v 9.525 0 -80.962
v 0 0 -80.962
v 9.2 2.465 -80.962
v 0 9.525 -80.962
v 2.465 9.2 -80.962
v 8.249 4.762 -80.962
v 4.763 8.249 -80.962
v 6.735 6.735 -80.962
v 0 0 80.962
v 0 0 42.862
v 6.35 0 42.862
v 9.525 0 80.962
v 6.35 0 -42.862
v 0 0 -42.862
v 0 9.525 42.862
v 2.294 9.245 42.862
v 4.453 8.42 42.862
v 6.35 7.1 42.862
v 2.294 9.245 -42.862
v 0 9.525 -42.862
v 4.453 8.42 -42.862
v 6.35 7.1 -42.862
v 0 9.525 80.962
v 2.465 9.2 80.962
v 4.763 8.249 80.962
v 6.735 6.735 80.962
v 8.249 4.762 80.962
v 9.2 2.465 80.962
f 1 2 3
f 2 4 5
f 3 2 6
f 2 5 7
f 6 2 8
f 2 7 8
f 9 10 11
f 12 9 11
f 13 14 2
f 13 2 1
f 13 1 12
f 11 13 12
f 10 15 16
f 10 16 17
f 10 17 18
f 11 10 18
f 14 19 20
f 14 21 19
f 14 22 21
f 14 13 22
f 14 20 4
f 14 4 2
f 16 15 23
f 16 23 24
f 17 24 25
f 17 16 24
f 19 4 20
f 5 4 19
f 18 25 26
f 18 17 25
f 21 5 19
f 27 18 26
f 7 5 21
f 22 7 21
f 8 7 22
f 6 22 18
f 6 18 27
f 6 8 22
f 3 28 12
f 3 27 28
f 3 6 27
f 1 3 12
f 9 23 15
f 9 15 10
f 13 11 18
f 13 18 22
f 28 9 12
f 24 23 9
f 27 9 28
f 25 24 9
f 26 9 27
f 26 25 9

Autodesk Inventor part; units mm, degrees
ref_plane "YZ Plane" through (0, 0, 0) normal (1, 0, 0) x (0, 1, 0)
ref_plane "XZ Plane" through (0, 0, 0) normal (0, 1, 0) x (-1, 0, 0)
ref_plane "XY Plane" through (0, 0, 0) normal (0, 0, 1) x (1, 0, 0)
sketch "Sketch1" plane through (0, 0, 0) normal (0, 0, 1) x (1, 0, 0)
  arc A0 (9.525, 0) -> (0, 9.525) centre (0, 0) ccw
  line L0 (0, 9.525) -> (0, 0)
  line L1 (0, 0) -> (9.525, 0)
  dimension "d0" = 19.05
extrude "Extrusion1" add sketch "Sketch1" along normal mid plane 161.925
sketch "Sketch2" plane through (0, 0, 80.9625) normal (0, -1, 0) x (1, 0, 0)
  line L0 (0, -38.1) -> (6.35, -38.1)
  line L1 (6.35, -38.1) -> (6.35, -123.825)
  line L2 (6.35, -123.825) -> (0, -123.825)
  line L3 (0, -123.825) -> (0, -38.1)
  line L4 (9.525, -161.925) -> (0, -161.925) projected
  line L5 (0, -161.925) -> (0, 0) projected
  point P0 (0, -80.9625)
  dimension "d3" = 85.725
  dimension "d4" = 38.1
  dimension "d5" = 6.35
extrude "Extrusion2" cut sketch "Sketch2" against normal through all
equation "\"d0\" = cornerRoundType"
equation "\"d1\" = lengthOfPart"
equation "\"d3\" = notchCutout"
equation "\"d4\" = bottomLength"
equation "\"cornerRoundType\" = 19.05"
equation "\"notchCutout\" = 85.725"
equation "\"bottomLength\" = 38.1"
equation "\"lengthOfPart\" = 2 * bottomLength + notchCutout"
properties part number "topOfStairs"
